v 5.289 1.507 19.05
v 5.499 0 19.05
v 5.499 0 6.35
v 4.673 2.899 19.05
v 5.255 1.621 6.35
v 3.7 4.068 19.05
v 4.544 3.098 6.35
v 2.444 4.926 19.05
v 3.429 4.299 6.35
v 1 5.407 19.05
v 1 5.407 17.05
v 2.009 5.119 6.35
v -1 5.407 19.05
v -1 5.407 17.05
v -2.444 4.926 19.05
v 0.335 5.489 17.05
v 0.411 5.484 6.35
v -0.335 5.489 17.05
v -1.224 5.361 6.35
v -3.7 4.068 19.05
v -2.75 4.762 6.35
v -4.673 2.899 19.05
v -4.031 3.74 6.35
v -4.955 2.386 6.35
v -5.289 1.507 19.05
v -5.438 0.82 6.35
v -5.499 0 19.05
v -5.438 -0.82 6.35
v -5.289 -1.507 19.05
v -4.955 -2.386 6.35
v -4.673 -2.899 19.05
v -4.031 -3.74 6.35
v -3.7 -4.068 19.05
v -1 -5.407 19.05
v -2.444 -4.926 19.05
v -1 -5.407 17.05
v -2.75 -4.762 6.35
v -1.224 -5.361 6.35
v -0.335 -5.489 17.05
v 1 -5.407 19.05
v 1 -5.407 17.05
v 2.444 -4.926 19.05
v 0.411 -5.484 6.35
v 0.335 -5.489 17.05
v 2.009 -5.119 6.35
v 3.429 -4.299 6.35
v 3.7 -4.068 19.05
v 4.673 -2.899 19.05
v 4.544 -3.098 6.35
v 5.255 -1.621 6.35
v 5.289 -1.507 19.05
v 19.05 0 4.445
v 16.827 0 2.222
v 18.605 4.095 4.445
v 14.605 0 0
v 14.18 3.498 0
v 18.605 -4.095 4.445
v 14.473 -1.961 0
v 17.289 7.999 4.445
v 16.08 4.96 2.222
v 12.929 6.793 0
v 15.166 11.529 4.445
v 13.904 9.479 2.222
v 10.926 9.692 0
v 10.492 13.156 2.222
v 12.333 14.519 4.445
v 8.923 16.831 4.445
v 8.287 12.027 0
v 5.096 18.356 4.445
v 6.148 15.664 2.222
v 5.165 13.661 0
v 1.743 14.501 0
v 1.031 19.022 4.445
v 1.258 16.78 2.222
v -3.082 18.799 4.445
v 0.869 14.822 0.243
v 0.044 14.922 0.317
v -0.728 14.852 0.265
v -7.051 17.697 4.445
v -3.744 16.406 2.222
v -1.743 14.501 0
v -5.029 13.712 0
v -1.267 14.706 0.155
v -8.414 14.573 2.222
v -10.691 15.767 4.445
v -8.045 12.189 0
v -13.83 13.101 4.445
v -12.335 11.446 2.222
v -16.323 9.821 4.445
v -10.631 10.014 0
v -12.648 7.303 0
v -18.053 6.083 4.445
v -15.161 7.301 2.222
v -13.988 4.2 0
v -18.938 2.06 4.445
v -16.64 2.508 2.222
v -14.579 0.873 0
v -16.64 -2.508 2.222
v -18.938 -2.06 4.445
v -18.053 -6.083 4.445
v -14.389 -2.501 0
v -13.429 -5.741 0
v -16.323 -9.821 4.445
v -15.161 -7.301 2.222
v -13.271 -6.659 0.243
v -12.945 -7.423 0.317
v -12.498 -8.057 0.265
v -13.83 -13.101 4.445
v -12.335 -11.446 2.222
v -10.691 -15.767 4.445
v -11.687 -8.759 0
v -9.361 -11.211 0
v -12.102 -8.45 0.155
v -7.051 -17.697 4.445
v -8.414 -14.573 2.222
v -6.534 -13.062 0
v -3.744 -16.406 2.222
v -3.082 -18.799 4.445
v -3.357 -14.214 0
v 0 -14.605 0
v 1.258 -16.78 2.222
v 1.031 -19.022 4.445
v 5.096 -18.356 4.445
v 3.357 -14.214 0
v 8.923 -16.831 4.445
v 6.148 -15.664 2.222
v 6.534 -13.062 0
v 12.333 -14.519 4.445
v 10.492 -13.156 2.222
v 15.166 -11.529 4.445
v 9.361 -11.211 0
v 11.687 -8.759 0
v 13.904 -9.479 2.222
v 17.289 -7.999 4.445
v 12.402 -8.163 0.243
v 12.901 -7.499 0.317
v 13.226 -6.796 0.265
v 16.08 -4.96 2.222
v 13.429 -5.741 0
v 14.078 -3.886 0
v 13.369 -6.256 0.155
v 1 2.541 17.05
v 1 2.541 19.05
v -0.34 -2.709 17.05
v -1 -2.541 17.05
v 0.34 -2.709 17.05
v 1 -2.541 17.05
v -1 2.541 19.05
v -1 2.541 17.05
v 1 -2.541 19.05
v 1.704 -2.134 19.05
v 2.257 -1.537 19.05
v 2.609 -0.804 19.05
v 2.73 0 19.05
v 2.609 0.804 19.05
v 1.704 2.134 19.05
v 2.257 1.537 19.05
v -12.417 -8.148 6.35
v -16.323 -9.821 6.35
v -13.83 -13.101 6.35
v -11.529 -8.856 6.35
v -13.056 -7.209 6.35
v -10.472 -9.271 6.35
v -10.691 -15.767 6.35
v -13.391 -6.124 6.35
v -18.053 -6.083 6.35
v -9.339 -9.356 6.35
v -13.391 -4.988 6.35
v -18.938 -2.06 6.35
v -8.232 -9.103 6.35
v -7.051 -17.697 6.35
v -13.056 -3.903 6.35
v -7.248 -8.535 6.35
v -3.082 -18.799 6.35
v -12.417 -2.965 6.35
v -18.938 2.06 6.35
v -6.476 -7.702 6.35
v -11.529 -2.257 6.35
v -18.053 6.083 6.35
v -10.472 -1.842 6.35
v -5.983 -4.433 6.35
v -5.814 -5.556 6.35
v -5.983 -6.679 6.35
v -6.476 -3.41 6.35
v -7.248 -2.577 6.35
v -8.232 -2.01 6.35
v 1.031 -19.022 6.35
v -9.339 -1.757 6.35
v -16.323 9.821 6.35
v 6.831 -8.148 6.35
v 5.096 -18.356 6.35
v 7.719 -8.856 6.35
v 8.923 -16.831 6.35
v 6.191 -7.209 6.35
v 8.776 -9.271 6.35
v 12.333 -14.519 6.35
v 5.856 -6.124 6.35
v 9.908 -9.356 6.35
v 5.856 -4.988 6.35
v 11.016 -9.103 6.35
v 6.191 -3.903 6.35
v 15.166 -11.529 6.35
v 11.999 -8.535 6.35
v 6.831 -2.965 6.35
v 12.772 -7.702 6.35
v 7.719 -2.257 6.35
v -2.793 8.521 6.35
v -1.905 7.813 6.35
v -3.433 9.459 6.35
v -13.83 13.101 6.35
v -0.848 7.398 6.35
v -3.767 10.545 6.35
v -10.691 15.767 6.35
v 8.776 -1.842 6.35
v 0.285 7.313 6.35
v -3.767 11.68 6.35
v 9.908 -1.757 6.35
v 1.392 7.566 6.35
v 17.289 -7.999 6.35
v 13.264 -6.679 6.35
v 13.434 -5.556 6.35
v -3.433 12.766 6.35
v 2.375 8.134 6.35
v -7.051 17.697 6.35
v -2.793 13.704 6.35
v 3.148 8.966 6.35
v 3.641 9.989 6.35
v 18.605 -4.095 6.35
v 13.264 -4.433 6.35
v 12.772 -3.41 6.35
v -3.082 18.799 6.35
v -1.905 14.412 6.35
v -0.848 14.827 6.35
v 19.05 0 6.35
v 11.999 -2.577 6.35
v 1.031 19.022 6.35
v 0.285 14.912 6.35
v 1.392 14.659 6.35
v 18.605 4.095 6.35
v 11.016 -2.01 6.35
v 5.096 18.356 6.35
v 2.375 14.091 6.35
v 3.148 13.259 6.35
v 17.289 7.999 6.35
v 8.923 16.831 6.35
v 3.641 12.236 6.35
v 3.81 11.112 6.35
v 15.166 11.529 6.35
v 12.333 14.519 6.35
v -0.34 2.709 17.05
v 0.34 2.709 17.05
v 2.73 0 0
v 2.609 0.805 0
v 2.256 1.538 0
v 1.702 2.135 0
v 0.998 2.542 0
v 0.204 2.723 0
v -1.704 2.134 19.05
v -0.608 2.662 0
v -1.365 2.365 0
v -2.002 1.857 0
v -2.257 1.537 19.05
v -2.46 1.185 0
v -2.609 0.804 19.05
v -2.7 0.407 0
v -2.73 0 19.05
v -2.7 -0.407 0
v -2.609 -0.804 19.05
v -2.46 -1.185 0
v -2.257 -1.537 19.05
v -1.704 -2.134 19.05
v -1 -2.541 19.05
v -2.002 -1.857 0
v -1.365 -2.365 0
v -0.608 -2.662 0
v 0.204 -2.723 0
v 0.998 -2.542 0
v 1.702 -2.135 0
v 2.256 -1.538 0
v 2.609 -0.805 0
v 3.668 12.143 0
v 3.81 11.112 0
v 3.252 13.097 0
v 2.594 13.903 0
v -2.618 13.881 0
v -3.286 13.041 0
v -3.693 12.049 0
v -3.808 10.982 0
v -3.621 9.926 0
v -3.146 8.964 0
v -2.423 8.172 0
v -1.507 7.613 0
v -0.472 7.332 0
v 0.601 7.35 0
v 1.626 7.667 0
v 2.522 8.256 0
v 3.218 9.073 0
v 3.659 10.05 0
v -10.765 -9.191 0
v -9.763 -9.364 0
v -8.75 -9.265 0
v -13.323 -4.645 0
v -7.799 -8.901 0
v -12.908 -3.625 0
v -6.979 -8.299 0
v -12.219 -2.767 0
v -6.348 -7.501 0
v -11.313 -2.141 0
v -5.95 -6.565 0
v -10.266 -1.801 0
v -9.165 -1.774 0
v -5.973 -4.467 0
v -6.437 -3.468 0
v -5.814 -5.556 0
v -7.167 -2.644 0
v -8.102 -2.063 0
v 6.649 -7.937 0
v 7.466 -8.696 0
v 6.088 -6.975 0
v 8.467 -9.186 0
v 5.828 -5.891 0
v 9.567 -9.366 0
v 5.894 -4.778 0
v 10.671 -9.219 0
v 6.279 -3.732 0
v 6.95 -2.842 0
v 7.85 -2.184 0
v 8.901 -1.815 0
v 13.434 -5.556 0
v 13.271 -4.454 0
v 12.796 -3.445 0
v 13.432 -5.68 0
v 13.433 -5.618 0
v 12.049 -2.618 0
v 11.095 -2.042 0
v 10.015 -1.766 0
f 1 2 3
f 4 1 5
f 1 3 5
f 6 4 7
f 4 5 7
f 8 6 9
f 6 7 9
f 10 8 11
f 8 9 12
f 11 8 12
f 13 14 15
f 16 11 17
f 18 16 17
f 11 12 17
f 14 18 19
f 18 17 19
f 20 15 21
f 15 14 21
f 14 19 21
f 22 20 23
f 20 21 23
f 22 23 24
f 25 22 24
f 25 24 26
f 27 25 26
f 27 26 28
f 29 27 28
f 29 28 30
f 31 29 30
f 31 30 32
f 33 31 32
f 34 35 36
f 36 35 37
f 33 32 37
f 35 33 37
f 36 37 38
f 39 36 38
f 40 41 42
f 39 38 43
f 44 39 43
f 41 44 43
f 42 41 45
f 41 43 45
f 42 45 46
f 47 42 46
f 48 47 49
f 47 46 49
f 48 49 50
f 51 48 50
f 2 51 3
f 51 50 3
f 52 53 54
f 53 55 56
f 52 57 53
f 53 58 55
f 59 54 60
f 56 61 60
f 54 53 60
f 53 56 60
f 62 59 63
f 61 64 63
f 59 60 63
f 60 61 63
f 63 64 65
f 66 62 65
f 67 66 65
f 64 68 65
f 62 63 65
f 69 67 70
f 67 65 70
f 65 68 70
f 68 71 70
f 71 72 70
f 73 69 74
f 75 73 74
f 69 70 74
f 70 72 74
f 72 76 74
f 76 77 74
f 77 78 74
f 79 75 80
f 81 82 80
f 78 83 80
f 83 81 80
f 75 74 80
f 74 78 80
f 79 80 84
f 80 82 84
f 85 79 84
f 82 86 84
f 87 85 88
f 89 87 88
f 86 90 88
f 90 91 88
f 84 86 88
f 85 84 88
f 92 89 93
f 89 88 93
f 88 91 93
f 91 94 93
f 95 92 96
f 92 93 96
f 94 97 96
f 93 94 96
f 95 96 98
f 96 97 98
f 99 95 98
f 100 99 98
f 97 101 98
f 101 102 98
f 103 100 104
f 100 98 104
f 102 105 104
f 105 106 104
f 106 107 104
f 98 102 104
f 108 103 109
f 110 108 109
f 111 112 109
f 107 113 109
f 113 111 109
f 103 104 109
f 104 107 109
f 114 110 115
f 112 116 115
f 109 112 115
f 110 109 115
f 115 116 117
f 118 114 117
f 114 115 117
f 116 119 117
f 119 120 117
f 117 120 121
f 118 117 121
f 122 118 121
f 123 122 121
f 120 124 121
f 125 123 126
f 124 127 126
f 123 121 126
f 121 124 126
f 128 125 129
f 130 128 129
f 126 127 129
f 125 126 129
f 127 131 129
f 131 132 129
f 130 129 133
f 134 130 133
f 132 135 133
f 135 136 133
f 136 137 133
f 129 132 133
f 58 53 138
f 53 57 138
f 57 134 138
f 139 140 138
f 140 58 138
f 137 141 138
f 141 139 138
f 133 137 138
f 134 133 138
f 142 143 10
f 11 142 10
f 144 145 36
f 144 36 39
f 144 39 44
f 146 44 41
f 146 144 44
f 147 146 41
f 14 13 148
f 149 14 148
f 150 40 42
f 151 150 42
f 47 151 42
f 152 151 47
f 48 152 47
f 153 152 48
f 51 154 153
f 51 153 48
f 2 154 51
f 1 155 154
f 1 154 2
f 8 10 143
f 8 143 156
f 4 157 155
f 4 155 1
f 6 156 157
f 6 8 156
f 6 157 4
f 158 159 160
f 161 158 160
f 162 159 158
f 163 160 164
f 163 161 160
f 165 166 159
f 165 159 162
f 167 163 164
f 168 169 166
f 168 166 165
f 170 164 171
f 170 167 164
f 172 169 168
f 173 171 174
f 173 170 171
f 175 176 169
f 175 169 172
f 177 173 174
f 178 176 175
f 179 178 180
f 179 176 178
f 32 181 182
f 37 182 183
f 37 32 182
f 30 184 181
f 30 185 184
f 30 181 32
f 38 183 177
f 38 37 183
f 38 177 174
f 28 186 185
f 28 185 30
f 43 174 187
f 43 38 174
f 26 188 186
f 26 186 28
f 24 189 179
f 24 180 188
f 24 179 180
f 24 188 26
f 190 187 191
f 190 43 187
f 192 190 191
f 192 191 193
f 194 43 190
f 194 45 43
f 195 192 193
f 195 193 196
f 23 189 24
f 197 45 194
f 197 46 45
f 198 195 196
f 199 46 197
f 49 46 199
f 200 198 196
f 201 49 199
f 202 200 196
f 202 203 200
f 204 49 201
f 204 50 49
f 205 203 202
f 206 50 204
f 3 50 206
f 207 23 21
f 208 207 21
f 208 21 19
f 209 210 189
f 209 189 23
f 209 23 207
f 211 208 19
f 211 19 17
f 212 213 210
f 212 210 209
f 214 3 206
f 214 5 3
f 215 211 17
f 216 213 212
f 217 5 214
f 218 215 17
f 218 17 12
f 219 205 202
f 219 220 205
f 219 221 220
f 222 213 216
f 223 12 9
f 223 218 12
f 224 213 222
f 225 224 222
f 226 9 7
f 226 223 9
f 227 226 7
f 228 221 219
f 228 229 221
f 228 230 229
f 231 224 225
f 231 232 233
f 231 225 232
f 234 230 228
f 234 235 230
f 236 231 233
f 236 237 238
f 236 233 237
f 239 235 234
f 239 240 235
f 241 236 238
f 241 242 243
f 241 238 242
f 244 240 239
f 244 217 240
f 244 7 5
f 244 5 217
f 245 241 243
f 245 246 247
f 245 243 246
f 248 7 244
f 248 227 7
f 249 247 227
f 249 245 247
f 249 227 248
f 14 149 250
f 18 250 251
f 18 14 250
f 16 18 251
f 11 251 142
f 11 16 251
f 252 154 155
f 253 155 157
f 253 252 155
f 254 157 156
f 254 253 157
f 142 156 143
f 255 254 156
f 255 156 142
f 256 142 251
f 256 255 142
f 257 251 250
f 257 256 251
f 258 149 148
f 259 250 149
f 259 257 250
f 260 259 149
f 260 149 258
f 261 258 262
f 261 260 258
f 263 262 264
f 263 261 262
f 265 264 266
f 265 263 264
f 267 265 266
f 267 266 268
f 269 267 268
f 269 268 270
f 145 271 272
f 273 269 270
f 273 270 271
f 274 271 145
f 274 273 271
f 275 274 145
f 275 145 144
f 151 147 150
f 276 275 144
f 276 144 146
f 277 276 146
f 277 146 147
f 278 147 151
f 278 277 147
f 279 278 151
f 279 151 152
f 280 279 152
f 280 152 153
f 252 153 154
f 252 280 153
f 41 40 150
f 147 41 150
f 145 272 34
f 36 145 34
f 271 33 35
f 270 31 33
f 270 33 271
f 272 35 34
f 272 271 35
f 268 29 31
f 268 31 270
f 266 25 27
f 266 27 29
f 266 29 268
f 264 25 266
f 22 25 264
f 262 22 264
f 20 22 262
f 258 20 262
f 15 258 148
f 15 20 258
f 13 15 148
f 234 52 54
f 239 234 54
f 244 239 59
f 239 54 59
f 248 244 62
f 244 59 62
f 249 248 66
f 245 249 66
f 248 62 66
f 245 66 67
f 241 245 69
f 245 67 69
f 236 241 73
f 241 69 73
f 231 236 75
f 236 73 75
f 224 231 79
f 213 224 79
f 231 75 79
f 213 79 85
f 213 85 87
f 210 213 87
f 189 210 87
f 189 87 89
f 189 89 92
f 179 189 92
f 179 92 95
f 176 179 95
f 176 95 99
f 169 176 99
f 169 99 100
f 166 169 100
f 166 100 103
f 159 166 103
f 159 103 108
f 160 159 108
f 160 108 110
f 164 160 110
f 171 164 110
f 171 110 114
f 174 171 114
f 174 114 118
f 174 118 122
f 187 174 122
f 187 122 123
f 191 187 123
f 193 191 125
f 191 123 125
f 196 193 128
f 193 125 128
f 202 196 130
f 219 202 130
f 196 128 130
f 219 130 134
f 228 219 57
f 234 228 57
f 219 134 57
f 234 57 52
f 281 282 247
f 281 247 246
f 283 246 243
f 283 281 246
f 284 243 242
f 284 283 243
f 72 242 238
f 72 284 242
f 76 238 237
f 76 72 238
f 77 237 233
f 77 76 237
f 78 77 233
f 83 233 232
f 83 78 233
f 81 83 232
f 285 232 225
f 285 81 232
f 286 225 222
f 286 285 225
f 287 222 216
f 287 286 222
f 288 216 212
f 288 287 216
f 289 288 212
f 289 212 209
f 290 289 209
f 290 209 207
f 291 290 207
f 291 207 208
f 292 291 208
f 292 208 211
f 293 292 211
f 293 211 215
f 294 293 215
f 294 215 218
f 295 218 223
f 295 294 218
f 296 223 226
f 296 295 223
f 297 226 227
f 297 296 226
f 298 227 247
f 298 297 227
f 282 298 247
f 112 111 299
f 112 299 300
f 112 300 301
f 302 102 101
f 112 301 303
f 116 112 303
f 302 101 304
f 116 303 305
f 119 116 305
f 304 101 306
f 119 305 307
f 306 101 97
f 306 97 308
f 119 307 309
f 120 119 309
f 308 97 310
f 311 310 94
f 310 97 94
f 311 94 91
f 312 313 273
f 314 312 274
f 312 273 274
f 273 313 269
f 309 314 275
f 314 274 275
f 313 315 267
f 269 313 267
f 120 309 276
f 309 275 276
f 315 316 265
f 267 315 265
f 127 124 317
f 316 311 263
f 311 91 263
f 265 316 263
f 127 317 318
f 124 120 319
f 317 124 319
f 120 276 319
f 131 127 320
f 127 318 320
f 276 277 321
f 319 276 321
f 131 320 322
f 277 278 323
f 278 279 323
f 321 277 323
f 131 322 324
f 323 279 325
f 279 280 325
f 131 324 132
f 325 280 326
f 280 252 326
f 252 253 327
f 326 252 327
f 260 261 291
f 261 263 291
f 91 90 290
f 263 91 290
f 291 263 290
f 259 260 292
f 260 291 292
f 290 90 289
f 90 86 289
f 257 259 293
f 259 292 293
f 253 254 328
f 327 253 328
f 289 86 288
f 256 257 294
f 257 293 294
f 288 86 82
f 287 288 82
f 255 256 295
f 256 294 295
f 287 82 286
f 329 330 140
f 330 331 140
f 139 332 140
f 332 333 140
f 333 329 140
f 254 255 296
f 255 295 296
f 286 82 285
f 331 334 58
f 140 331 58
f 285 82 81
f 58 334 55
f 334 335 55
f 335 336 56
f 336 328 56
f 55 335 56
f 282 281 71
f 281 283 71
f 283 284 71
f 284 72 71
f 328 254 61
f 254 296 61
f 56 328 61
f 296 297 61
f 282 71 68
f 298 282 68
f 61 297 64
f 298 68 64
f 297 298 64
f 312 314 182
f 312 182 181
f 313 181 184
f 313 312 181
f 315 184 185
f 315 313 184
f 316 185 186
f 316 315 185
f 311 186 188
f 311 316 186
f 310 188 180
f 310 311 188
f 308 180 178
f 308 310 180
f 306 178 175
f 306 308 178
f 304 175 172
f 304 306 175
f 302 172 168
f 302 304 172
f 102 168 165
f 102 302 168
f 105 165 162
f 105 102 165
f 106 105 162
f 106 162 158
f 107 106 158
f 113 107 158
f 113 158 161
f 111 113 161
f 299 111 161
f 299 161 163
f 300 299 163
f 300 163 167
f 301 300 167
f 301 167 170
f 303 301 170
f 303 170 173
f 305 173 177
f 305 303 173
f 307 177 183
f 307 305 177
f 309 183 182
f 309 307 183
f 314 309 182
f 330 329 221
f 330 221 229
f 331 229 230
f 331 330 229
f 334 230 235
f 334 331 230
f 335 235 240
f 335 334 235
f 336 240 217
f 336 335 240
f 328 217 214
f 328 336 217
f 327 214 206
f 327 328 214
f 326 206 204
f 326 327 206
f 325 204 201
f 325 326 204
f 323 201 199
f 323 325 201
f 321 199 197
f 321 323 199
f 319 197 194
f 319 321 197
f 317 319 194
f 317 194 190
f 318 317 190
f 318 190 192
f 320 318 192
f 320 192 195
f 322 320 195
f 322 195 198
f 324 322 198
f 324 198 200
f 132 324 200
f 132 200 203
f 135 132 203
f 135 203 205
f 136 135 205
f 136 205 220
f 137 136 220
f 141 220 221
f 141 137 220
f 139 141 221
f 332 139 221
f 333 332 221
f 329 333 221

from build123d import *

# Parameters (mm, degrees)
F0_R     = 19.05
F0_R_2   = 3.81
F0_R_3   = 5.4991
F1_DEPTH = 6.35
F0_R_4   = 2.7305
F2_DEPTH = 19.05
F4_DEPTH = 2


# Not quite as in the source:
# - a fillet or chamfer that OpenCascade refuses, or shapes differently, is made with other operations: its cross-section is extruded or revolved along the edge and cut away or added


with BuildPart() as f1:
    # F0 (on Top) → F1 (new body)
    with BuildSketch(Plane.XY):
        Circle(F0_R)
        with Locations((-9.6237072996, -5.55625)):
            Circle(F0_R_2, mode=Mode.SUBTRACT)
        with Locations((9.6237072996, -5.55625)):
            Circle(F0_R_2, mode=Mode.SUBTRACT)
        Circle(F0_R_3, mode=Mode.SUBTRACT)
        with Locations((0, 11.1125)):
            Circle(F0_R_2, mode=Mode.SUBTRACT)
    extrude(amount=F1_DEPTH)

    # F0 (on Top) → F2 (join)
    with BuildSketch(Plane.XY):
        Circle(F0_R_3)
        Circle(F0_R_4, mode=Mode.SUBTRACT)
    extrude(amount=F2_DEPTH)

    # F3 (on face) → F4 (cut)
    with BuildSketch(Plane.XY.offset(19.05)):
        with BuildLine():
            Line((1, 2.5407932324), (1, 5.4074116553))
            ThreePointArc((1, 5.4074116553), (0, 5.4991), (-1, 5.4074116553))
            Line((-1, 5.4074116553), (-1, 2.5407932324))
            ThreePointArc((-1, 2.5407932324), (0, 2.7305), (1, 2.5407932324))
        make_face()
        with BuildLine():
            Line((1, -5.4074116553), (1, -2.5407932324))
            ThreePointArc((1, -2.5407932324), (0, -2.7305), (-1, -2.5407932324))
            Line((-1, -2.5407932324), (-1, -5.4074116553))
            ThreePointArc((-1, -5.4074116553), (0, -5.4991), (1, -5.4074116553))
        make_face()
    extrude(amount=-F4_DEPTH, mode=Mode.SUBTRACT)

    # F5: chamfer of 4.445 on 1 edges, made by hand

    # F5_s1 → F5_t2 (revolve, cut)
    with BuildSketch(Plane.XZ):
        Polygon((19.05, 4.445), (14.605, 0), (19.05, 0), align=None)
    revolve(axis=Axis((0, 0, 0), (0, 0, 1)), mode=Mode.SUBTRACT)


solid = f1.part
